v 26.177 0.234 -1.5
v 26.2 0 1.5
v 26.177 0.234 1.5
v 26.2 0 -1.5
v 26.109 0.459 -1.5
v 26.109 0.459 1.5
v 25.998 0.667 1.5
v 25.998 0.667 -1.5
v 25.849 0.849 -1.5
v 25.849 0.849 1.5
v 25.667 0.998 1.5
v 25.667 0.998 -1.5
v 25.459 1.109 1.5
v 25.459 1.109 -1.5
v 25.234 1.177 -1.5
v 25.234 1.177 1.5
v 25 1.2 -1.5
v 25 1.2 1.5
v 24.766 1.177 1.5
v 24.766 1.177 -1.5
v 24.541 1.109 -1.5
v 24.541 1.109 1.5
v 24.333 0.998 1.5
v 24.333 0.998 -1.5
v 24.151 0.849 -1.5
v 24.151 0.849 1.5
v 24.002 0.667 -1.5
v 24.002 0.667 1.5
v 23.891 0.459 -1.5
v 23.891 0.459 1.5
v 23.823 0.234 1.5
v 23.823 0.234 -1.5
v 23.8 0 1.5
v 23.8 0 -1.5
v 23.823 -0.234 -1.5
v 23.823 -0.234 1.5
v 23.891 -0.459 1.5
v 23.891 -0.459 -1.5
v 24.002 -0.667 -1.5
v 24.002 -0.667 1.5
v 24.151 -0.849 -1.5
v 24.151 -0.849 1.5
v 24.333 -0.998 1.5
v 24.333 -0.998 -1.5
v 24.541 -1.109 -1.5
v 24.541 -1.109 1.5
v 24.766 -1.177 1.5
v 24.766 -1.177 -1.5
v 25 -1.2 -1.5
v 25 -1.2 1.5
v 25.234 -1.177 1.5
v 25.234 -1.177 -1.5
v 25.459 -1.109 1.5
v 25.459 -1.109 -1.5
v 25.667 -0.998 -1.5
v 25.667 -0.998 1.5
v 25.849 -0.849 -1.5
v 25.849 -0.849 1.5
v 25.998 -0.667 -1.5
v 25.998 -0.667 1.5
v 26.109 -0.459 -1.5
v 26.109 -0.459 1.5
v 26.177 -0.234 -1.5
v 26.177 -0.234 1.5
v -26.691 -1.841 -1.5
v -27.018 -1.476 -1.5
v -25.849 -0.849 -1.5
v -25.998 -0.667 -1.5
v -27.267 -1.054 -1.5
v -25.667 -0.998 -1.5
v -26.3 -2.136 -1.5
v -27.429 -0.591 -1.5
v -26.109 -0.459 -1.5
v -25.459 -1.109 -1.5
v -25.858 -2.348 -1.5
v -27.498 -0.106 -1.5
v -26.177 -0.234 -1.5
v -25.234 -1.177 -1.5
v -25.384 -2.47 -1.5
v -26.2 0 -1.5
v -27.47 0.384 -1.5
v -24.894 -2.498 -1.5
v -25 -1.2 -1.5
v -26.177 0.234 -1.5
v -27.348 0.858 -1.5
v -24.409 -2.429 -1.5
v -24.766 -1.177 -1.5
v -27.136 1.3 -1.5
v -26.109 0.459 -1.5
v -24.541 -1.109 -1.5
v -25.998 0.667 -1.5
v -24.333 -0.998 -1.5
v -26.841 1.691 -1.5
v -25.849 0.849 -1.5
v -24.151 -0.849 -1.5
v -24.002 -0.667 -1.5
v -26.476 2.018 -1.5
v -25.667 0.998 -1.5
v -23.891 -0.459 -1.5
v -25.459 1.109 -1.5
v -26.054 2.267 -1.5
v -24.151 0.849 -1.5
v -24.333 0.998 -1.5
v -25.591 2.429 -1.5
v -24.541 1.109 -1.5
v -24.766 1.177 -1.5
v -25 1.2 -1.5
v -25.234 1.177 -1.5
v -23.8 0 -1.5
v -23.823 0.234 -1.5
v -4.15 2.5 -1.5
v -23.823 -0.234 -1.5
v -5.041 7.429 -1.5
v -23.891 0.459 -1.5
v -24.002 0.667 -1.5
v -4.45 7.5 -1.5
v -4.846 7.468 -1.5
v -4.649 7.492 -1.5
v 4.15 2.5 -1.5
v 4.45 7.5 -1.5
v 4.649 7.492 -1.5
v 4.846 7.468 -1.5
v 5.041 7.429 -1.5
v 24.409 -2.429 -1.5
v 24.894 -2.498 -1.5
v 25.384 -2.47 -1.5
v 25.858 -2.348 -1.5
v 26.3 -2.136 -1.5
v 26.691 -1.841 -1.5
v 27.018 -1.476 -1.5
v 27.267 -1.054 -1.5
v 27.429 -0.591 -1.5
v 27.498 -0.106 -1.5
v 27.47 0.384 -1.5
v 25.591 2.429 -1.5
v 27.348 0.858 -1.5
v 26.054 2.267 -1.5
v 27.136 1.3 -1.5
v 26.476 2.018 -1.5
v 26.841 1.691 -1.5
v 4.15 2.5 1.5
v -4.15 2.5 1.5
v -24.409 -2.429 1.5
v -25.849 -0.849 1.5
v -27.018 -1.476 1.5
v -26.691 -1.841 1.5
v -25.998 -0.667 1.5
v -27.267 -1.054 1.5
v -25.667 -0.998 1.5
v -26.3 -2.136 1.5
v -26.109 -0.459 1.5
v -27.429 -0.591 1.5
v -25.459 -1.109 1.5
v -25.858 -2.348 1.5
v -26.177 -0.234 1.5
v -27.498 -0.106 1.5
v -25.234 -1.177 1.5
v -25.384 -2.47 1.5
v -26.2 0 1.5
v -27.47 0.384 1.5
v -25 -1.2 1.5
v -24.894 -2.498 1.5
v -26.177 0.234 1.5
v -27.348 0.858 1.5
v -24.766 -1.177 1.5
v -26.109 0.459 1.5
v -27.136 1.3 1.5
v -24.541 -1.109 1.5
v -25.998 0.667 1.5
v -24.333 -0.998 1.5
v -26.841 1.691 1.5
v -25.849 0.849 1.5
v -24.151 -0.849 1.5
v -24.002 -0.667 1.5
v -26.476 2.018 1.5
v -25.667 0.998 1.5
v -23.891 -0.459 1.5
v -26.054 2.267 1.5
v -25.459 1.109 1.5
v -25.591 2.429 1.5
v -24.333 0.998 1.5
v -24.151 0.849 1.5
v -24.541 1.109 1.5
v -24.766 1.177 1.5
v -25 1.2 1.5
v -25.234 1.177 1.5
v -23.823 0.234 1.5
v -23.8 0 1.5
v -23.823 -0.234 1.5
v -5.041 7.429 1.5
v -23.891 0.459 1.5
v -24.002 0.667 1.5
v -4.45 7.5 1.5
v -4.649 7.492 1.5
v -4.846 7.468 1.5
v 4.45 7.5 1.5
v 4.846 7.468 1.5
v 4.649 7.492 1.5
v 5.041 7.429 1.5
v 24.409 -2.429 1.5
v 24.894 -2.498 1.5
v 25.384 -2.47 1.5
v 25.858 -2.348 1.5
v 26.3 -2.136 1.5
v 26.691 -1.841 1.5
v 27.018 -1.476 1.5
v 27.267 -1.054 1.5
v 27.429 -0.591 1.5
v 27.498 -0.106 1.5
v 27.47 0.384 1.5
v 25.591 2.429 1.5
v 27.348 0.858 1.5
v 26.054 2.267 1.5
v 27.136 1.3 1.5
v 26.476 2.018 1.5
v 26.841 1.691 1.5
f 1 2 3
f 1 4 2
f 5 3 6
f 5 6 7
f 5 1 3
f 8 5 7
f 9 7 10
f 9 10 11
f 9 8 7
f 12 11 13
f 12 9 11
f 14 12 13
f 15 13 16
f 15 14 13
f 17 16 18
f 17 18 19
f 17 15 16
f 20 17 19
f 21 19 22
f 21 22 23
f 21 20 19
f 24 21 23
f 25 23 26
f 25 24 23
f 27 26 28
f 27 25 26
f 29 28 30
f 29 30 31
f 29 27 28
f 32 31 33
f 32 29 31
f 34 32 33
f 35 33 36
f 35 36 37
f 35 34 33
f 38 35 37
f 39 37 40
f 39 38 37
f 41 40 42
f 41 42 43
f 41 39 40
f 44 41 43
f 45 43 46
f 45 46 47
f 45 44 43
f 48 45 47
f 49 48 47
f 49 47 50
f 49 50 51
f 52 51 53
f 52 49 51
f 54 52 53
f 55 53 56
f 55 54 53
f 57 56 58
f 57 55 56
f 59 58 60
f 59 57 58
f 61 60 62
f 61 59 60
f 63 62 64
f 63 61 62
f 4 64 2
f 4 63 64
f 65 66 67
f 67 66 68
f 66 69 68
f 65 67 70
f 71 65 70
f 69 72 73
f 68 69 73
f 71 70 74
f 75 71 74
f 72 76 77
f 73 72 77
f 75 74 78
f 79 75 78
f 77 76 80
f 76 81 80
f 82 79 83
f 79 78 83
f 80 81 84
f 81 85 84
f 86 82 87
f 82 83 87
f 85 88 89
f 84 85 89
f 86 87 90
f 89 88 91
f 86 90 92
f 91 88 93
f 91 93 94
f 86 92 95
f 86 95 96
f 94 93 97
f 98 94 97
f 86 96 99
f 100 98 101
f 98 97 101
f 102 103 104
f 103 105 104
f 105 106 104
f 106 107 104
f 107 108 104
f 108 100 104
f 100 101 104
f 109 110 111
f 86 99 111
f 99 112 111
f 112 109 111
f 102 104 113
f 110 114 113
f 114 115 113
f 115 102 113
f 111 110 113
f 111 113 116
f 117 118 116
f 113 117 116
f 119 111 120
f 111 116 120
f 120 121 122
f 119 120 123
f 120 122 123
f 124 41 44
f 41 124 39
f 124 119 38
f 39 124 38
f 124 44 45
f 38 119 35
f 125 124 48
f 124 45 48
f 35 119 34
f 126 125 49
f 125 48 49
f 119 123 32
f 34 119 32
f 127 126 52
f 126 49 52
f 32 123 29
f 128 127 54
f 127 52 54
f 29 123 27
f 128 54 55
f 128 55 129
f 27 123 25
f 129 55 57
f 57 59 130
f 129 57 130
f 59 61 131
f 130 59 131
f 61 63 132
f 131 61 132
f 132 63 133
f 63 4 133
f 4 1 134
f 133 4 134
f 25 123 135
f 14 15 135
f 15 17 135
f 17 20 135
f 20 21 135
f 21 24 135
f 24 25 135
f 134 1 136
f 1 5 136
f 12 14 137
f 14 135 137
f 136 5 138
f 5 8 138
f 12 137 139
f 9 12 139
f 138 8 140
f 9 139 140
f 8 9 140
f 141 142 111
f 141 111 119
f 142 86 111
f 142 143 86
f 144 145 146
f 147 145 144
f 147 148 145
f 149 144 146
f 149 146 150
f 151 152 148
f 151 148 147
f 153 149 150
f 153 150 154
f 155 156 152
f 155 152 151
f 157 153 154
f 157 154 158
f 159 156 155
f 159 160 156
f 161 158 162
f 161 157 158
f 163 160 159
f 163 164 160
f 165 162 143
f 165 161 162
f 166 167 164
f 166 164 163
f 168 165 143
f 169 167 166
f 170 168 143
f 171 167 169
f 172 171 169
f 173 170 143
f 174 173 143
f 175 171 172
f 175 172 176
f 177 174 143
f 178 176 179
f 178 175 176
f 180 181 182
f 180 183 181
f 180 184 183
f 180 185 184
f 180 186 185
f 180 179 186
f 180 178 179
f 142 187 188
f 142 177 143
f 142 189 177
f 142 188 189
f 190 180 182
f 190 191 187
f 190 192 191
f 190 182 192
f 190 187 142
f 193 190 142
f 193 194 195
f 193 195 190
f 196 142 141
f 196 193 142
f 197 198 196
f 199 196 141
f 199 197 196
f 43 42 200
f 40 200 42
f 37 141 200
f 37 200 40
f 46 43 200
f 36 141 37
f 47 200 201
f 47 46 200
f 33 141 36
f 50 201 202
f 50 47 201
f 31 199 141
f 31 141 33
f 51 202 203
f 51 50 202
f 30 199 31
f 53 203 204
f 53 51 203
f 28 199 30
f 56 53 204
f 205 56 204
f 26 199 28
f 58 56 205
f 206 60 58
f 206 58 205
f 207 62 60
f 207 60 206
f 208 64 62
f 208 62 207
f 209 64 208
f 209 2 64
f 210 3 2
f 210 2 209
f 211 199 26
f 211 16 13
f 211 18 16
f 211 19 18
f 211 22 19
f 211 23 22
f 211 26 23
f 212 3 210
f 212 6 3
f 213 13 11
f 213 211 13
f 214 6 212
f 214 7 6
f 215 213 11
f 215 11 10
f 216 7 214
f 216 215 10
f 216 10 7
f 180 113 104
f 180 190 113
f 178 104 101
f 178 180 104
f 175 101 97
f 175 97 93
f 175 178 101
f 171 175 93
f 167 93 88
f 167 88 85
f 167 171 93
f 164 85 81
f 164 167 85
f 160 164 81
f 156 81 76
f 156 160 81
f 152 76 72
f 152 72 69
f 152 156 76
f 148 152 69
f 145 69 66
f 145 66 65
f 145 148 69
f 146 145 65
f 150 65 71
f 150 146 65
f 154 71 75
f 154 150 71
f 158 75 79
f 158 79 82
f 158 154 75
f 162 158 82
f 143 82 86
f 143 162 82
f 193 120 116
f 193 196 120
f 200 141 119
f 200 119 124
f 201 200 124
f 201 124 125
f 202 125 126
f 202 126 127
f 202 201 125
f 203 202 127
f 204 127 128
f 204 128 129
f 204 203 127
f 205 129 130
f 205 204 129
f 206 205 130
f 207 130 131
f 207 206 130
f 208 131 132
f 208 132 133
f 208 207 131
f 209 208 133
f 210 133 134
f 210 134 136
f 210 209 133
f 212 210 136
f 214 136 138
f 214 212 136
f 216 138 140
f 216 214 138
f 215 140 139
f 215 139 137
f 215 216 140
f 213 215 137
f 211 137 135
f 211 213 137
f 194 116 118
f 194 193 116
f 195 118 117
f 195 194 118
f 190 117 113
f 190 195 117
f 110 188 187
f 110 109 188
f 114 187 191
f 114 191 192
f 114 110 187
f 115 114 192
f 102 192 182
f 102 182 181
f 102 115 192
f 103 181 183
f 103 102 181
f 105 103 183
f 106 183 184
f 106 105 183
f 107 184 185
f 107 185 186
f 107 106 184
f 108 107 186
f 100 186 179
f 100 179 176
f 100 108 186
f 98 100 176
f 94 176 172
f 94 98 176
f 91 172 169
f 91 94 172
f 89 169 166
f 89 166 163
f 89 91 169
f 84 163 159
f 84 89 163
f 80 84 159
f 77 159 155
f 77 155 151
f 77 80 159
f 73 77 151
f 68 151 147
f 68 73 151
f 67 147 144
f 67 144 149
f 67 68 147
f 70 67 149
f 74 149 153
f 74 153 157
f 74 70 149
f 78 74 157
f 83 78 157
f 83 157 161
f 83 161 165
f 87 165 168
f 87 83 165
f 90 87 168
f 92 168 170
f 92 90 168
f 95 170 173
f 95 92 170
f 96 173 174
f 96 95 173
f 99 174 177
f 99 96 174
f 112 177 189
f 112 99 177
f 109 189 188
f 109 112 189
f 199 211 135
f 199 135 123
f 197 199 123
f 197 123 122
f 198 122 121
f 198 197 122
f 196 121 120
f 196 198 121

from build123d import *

# Parameters (mm, degrees)
SKETCH1_R           = 1.2
BOSS_EXTRUDE1_DEPTH = 1.5


with BuildPart() as part:
    # Sketch1 → Boss-Extrude1 (new body, symmetric)
    with BuildSketch(Plane.XY):
        with BuildLine():
            Line((-24.40896688, -2.429131501), (-4.150358361, 2.5))
            Line((-4.150358361, 2.5), (4.150358361, 2.5))
            Line((4.150358361, 2.5), (24.40896688, -2.429131501))
            ThreePointArc((24.40896688, -2.429131501), (27.429131501, -0.59103312), (25.59103312, 2.429131501))
            Line((25.59103312, 2.429131501), (5.041156826, 7.429131501))
            ThreePointArc((5.041156826, 7.429131501), (4.747757076, 7.482219647), (4.450123705, 7.5))
            Line((4.450123705, 7.5), (-4.450123705, 7.5))
            ThreePointArc((-4.450123705, 7.5), (-4.747757076, 7.482219647), (-5.041156826, 7.429131501))
            Line((-5.041156826, 7.429131501), (-25.59103312, 2.429131501))
            ThreePointArc((-25.59103312, 2.429131501), (-27.429131501, -0.59103312), (-24.40896688, -2.429131501))
        make_face()
        with Locations((-25, 0)):
            Circle(SKETCH1_R, mode=Mode.SUBTRACT)
        with Locations((25, 0)):
            Circle(SKETCH1_R, mode=Mode.SUBTRACT)
    extrude(amount=BOSS_EXTRUDE1_DEPTH, both=True)


solid = part.part
